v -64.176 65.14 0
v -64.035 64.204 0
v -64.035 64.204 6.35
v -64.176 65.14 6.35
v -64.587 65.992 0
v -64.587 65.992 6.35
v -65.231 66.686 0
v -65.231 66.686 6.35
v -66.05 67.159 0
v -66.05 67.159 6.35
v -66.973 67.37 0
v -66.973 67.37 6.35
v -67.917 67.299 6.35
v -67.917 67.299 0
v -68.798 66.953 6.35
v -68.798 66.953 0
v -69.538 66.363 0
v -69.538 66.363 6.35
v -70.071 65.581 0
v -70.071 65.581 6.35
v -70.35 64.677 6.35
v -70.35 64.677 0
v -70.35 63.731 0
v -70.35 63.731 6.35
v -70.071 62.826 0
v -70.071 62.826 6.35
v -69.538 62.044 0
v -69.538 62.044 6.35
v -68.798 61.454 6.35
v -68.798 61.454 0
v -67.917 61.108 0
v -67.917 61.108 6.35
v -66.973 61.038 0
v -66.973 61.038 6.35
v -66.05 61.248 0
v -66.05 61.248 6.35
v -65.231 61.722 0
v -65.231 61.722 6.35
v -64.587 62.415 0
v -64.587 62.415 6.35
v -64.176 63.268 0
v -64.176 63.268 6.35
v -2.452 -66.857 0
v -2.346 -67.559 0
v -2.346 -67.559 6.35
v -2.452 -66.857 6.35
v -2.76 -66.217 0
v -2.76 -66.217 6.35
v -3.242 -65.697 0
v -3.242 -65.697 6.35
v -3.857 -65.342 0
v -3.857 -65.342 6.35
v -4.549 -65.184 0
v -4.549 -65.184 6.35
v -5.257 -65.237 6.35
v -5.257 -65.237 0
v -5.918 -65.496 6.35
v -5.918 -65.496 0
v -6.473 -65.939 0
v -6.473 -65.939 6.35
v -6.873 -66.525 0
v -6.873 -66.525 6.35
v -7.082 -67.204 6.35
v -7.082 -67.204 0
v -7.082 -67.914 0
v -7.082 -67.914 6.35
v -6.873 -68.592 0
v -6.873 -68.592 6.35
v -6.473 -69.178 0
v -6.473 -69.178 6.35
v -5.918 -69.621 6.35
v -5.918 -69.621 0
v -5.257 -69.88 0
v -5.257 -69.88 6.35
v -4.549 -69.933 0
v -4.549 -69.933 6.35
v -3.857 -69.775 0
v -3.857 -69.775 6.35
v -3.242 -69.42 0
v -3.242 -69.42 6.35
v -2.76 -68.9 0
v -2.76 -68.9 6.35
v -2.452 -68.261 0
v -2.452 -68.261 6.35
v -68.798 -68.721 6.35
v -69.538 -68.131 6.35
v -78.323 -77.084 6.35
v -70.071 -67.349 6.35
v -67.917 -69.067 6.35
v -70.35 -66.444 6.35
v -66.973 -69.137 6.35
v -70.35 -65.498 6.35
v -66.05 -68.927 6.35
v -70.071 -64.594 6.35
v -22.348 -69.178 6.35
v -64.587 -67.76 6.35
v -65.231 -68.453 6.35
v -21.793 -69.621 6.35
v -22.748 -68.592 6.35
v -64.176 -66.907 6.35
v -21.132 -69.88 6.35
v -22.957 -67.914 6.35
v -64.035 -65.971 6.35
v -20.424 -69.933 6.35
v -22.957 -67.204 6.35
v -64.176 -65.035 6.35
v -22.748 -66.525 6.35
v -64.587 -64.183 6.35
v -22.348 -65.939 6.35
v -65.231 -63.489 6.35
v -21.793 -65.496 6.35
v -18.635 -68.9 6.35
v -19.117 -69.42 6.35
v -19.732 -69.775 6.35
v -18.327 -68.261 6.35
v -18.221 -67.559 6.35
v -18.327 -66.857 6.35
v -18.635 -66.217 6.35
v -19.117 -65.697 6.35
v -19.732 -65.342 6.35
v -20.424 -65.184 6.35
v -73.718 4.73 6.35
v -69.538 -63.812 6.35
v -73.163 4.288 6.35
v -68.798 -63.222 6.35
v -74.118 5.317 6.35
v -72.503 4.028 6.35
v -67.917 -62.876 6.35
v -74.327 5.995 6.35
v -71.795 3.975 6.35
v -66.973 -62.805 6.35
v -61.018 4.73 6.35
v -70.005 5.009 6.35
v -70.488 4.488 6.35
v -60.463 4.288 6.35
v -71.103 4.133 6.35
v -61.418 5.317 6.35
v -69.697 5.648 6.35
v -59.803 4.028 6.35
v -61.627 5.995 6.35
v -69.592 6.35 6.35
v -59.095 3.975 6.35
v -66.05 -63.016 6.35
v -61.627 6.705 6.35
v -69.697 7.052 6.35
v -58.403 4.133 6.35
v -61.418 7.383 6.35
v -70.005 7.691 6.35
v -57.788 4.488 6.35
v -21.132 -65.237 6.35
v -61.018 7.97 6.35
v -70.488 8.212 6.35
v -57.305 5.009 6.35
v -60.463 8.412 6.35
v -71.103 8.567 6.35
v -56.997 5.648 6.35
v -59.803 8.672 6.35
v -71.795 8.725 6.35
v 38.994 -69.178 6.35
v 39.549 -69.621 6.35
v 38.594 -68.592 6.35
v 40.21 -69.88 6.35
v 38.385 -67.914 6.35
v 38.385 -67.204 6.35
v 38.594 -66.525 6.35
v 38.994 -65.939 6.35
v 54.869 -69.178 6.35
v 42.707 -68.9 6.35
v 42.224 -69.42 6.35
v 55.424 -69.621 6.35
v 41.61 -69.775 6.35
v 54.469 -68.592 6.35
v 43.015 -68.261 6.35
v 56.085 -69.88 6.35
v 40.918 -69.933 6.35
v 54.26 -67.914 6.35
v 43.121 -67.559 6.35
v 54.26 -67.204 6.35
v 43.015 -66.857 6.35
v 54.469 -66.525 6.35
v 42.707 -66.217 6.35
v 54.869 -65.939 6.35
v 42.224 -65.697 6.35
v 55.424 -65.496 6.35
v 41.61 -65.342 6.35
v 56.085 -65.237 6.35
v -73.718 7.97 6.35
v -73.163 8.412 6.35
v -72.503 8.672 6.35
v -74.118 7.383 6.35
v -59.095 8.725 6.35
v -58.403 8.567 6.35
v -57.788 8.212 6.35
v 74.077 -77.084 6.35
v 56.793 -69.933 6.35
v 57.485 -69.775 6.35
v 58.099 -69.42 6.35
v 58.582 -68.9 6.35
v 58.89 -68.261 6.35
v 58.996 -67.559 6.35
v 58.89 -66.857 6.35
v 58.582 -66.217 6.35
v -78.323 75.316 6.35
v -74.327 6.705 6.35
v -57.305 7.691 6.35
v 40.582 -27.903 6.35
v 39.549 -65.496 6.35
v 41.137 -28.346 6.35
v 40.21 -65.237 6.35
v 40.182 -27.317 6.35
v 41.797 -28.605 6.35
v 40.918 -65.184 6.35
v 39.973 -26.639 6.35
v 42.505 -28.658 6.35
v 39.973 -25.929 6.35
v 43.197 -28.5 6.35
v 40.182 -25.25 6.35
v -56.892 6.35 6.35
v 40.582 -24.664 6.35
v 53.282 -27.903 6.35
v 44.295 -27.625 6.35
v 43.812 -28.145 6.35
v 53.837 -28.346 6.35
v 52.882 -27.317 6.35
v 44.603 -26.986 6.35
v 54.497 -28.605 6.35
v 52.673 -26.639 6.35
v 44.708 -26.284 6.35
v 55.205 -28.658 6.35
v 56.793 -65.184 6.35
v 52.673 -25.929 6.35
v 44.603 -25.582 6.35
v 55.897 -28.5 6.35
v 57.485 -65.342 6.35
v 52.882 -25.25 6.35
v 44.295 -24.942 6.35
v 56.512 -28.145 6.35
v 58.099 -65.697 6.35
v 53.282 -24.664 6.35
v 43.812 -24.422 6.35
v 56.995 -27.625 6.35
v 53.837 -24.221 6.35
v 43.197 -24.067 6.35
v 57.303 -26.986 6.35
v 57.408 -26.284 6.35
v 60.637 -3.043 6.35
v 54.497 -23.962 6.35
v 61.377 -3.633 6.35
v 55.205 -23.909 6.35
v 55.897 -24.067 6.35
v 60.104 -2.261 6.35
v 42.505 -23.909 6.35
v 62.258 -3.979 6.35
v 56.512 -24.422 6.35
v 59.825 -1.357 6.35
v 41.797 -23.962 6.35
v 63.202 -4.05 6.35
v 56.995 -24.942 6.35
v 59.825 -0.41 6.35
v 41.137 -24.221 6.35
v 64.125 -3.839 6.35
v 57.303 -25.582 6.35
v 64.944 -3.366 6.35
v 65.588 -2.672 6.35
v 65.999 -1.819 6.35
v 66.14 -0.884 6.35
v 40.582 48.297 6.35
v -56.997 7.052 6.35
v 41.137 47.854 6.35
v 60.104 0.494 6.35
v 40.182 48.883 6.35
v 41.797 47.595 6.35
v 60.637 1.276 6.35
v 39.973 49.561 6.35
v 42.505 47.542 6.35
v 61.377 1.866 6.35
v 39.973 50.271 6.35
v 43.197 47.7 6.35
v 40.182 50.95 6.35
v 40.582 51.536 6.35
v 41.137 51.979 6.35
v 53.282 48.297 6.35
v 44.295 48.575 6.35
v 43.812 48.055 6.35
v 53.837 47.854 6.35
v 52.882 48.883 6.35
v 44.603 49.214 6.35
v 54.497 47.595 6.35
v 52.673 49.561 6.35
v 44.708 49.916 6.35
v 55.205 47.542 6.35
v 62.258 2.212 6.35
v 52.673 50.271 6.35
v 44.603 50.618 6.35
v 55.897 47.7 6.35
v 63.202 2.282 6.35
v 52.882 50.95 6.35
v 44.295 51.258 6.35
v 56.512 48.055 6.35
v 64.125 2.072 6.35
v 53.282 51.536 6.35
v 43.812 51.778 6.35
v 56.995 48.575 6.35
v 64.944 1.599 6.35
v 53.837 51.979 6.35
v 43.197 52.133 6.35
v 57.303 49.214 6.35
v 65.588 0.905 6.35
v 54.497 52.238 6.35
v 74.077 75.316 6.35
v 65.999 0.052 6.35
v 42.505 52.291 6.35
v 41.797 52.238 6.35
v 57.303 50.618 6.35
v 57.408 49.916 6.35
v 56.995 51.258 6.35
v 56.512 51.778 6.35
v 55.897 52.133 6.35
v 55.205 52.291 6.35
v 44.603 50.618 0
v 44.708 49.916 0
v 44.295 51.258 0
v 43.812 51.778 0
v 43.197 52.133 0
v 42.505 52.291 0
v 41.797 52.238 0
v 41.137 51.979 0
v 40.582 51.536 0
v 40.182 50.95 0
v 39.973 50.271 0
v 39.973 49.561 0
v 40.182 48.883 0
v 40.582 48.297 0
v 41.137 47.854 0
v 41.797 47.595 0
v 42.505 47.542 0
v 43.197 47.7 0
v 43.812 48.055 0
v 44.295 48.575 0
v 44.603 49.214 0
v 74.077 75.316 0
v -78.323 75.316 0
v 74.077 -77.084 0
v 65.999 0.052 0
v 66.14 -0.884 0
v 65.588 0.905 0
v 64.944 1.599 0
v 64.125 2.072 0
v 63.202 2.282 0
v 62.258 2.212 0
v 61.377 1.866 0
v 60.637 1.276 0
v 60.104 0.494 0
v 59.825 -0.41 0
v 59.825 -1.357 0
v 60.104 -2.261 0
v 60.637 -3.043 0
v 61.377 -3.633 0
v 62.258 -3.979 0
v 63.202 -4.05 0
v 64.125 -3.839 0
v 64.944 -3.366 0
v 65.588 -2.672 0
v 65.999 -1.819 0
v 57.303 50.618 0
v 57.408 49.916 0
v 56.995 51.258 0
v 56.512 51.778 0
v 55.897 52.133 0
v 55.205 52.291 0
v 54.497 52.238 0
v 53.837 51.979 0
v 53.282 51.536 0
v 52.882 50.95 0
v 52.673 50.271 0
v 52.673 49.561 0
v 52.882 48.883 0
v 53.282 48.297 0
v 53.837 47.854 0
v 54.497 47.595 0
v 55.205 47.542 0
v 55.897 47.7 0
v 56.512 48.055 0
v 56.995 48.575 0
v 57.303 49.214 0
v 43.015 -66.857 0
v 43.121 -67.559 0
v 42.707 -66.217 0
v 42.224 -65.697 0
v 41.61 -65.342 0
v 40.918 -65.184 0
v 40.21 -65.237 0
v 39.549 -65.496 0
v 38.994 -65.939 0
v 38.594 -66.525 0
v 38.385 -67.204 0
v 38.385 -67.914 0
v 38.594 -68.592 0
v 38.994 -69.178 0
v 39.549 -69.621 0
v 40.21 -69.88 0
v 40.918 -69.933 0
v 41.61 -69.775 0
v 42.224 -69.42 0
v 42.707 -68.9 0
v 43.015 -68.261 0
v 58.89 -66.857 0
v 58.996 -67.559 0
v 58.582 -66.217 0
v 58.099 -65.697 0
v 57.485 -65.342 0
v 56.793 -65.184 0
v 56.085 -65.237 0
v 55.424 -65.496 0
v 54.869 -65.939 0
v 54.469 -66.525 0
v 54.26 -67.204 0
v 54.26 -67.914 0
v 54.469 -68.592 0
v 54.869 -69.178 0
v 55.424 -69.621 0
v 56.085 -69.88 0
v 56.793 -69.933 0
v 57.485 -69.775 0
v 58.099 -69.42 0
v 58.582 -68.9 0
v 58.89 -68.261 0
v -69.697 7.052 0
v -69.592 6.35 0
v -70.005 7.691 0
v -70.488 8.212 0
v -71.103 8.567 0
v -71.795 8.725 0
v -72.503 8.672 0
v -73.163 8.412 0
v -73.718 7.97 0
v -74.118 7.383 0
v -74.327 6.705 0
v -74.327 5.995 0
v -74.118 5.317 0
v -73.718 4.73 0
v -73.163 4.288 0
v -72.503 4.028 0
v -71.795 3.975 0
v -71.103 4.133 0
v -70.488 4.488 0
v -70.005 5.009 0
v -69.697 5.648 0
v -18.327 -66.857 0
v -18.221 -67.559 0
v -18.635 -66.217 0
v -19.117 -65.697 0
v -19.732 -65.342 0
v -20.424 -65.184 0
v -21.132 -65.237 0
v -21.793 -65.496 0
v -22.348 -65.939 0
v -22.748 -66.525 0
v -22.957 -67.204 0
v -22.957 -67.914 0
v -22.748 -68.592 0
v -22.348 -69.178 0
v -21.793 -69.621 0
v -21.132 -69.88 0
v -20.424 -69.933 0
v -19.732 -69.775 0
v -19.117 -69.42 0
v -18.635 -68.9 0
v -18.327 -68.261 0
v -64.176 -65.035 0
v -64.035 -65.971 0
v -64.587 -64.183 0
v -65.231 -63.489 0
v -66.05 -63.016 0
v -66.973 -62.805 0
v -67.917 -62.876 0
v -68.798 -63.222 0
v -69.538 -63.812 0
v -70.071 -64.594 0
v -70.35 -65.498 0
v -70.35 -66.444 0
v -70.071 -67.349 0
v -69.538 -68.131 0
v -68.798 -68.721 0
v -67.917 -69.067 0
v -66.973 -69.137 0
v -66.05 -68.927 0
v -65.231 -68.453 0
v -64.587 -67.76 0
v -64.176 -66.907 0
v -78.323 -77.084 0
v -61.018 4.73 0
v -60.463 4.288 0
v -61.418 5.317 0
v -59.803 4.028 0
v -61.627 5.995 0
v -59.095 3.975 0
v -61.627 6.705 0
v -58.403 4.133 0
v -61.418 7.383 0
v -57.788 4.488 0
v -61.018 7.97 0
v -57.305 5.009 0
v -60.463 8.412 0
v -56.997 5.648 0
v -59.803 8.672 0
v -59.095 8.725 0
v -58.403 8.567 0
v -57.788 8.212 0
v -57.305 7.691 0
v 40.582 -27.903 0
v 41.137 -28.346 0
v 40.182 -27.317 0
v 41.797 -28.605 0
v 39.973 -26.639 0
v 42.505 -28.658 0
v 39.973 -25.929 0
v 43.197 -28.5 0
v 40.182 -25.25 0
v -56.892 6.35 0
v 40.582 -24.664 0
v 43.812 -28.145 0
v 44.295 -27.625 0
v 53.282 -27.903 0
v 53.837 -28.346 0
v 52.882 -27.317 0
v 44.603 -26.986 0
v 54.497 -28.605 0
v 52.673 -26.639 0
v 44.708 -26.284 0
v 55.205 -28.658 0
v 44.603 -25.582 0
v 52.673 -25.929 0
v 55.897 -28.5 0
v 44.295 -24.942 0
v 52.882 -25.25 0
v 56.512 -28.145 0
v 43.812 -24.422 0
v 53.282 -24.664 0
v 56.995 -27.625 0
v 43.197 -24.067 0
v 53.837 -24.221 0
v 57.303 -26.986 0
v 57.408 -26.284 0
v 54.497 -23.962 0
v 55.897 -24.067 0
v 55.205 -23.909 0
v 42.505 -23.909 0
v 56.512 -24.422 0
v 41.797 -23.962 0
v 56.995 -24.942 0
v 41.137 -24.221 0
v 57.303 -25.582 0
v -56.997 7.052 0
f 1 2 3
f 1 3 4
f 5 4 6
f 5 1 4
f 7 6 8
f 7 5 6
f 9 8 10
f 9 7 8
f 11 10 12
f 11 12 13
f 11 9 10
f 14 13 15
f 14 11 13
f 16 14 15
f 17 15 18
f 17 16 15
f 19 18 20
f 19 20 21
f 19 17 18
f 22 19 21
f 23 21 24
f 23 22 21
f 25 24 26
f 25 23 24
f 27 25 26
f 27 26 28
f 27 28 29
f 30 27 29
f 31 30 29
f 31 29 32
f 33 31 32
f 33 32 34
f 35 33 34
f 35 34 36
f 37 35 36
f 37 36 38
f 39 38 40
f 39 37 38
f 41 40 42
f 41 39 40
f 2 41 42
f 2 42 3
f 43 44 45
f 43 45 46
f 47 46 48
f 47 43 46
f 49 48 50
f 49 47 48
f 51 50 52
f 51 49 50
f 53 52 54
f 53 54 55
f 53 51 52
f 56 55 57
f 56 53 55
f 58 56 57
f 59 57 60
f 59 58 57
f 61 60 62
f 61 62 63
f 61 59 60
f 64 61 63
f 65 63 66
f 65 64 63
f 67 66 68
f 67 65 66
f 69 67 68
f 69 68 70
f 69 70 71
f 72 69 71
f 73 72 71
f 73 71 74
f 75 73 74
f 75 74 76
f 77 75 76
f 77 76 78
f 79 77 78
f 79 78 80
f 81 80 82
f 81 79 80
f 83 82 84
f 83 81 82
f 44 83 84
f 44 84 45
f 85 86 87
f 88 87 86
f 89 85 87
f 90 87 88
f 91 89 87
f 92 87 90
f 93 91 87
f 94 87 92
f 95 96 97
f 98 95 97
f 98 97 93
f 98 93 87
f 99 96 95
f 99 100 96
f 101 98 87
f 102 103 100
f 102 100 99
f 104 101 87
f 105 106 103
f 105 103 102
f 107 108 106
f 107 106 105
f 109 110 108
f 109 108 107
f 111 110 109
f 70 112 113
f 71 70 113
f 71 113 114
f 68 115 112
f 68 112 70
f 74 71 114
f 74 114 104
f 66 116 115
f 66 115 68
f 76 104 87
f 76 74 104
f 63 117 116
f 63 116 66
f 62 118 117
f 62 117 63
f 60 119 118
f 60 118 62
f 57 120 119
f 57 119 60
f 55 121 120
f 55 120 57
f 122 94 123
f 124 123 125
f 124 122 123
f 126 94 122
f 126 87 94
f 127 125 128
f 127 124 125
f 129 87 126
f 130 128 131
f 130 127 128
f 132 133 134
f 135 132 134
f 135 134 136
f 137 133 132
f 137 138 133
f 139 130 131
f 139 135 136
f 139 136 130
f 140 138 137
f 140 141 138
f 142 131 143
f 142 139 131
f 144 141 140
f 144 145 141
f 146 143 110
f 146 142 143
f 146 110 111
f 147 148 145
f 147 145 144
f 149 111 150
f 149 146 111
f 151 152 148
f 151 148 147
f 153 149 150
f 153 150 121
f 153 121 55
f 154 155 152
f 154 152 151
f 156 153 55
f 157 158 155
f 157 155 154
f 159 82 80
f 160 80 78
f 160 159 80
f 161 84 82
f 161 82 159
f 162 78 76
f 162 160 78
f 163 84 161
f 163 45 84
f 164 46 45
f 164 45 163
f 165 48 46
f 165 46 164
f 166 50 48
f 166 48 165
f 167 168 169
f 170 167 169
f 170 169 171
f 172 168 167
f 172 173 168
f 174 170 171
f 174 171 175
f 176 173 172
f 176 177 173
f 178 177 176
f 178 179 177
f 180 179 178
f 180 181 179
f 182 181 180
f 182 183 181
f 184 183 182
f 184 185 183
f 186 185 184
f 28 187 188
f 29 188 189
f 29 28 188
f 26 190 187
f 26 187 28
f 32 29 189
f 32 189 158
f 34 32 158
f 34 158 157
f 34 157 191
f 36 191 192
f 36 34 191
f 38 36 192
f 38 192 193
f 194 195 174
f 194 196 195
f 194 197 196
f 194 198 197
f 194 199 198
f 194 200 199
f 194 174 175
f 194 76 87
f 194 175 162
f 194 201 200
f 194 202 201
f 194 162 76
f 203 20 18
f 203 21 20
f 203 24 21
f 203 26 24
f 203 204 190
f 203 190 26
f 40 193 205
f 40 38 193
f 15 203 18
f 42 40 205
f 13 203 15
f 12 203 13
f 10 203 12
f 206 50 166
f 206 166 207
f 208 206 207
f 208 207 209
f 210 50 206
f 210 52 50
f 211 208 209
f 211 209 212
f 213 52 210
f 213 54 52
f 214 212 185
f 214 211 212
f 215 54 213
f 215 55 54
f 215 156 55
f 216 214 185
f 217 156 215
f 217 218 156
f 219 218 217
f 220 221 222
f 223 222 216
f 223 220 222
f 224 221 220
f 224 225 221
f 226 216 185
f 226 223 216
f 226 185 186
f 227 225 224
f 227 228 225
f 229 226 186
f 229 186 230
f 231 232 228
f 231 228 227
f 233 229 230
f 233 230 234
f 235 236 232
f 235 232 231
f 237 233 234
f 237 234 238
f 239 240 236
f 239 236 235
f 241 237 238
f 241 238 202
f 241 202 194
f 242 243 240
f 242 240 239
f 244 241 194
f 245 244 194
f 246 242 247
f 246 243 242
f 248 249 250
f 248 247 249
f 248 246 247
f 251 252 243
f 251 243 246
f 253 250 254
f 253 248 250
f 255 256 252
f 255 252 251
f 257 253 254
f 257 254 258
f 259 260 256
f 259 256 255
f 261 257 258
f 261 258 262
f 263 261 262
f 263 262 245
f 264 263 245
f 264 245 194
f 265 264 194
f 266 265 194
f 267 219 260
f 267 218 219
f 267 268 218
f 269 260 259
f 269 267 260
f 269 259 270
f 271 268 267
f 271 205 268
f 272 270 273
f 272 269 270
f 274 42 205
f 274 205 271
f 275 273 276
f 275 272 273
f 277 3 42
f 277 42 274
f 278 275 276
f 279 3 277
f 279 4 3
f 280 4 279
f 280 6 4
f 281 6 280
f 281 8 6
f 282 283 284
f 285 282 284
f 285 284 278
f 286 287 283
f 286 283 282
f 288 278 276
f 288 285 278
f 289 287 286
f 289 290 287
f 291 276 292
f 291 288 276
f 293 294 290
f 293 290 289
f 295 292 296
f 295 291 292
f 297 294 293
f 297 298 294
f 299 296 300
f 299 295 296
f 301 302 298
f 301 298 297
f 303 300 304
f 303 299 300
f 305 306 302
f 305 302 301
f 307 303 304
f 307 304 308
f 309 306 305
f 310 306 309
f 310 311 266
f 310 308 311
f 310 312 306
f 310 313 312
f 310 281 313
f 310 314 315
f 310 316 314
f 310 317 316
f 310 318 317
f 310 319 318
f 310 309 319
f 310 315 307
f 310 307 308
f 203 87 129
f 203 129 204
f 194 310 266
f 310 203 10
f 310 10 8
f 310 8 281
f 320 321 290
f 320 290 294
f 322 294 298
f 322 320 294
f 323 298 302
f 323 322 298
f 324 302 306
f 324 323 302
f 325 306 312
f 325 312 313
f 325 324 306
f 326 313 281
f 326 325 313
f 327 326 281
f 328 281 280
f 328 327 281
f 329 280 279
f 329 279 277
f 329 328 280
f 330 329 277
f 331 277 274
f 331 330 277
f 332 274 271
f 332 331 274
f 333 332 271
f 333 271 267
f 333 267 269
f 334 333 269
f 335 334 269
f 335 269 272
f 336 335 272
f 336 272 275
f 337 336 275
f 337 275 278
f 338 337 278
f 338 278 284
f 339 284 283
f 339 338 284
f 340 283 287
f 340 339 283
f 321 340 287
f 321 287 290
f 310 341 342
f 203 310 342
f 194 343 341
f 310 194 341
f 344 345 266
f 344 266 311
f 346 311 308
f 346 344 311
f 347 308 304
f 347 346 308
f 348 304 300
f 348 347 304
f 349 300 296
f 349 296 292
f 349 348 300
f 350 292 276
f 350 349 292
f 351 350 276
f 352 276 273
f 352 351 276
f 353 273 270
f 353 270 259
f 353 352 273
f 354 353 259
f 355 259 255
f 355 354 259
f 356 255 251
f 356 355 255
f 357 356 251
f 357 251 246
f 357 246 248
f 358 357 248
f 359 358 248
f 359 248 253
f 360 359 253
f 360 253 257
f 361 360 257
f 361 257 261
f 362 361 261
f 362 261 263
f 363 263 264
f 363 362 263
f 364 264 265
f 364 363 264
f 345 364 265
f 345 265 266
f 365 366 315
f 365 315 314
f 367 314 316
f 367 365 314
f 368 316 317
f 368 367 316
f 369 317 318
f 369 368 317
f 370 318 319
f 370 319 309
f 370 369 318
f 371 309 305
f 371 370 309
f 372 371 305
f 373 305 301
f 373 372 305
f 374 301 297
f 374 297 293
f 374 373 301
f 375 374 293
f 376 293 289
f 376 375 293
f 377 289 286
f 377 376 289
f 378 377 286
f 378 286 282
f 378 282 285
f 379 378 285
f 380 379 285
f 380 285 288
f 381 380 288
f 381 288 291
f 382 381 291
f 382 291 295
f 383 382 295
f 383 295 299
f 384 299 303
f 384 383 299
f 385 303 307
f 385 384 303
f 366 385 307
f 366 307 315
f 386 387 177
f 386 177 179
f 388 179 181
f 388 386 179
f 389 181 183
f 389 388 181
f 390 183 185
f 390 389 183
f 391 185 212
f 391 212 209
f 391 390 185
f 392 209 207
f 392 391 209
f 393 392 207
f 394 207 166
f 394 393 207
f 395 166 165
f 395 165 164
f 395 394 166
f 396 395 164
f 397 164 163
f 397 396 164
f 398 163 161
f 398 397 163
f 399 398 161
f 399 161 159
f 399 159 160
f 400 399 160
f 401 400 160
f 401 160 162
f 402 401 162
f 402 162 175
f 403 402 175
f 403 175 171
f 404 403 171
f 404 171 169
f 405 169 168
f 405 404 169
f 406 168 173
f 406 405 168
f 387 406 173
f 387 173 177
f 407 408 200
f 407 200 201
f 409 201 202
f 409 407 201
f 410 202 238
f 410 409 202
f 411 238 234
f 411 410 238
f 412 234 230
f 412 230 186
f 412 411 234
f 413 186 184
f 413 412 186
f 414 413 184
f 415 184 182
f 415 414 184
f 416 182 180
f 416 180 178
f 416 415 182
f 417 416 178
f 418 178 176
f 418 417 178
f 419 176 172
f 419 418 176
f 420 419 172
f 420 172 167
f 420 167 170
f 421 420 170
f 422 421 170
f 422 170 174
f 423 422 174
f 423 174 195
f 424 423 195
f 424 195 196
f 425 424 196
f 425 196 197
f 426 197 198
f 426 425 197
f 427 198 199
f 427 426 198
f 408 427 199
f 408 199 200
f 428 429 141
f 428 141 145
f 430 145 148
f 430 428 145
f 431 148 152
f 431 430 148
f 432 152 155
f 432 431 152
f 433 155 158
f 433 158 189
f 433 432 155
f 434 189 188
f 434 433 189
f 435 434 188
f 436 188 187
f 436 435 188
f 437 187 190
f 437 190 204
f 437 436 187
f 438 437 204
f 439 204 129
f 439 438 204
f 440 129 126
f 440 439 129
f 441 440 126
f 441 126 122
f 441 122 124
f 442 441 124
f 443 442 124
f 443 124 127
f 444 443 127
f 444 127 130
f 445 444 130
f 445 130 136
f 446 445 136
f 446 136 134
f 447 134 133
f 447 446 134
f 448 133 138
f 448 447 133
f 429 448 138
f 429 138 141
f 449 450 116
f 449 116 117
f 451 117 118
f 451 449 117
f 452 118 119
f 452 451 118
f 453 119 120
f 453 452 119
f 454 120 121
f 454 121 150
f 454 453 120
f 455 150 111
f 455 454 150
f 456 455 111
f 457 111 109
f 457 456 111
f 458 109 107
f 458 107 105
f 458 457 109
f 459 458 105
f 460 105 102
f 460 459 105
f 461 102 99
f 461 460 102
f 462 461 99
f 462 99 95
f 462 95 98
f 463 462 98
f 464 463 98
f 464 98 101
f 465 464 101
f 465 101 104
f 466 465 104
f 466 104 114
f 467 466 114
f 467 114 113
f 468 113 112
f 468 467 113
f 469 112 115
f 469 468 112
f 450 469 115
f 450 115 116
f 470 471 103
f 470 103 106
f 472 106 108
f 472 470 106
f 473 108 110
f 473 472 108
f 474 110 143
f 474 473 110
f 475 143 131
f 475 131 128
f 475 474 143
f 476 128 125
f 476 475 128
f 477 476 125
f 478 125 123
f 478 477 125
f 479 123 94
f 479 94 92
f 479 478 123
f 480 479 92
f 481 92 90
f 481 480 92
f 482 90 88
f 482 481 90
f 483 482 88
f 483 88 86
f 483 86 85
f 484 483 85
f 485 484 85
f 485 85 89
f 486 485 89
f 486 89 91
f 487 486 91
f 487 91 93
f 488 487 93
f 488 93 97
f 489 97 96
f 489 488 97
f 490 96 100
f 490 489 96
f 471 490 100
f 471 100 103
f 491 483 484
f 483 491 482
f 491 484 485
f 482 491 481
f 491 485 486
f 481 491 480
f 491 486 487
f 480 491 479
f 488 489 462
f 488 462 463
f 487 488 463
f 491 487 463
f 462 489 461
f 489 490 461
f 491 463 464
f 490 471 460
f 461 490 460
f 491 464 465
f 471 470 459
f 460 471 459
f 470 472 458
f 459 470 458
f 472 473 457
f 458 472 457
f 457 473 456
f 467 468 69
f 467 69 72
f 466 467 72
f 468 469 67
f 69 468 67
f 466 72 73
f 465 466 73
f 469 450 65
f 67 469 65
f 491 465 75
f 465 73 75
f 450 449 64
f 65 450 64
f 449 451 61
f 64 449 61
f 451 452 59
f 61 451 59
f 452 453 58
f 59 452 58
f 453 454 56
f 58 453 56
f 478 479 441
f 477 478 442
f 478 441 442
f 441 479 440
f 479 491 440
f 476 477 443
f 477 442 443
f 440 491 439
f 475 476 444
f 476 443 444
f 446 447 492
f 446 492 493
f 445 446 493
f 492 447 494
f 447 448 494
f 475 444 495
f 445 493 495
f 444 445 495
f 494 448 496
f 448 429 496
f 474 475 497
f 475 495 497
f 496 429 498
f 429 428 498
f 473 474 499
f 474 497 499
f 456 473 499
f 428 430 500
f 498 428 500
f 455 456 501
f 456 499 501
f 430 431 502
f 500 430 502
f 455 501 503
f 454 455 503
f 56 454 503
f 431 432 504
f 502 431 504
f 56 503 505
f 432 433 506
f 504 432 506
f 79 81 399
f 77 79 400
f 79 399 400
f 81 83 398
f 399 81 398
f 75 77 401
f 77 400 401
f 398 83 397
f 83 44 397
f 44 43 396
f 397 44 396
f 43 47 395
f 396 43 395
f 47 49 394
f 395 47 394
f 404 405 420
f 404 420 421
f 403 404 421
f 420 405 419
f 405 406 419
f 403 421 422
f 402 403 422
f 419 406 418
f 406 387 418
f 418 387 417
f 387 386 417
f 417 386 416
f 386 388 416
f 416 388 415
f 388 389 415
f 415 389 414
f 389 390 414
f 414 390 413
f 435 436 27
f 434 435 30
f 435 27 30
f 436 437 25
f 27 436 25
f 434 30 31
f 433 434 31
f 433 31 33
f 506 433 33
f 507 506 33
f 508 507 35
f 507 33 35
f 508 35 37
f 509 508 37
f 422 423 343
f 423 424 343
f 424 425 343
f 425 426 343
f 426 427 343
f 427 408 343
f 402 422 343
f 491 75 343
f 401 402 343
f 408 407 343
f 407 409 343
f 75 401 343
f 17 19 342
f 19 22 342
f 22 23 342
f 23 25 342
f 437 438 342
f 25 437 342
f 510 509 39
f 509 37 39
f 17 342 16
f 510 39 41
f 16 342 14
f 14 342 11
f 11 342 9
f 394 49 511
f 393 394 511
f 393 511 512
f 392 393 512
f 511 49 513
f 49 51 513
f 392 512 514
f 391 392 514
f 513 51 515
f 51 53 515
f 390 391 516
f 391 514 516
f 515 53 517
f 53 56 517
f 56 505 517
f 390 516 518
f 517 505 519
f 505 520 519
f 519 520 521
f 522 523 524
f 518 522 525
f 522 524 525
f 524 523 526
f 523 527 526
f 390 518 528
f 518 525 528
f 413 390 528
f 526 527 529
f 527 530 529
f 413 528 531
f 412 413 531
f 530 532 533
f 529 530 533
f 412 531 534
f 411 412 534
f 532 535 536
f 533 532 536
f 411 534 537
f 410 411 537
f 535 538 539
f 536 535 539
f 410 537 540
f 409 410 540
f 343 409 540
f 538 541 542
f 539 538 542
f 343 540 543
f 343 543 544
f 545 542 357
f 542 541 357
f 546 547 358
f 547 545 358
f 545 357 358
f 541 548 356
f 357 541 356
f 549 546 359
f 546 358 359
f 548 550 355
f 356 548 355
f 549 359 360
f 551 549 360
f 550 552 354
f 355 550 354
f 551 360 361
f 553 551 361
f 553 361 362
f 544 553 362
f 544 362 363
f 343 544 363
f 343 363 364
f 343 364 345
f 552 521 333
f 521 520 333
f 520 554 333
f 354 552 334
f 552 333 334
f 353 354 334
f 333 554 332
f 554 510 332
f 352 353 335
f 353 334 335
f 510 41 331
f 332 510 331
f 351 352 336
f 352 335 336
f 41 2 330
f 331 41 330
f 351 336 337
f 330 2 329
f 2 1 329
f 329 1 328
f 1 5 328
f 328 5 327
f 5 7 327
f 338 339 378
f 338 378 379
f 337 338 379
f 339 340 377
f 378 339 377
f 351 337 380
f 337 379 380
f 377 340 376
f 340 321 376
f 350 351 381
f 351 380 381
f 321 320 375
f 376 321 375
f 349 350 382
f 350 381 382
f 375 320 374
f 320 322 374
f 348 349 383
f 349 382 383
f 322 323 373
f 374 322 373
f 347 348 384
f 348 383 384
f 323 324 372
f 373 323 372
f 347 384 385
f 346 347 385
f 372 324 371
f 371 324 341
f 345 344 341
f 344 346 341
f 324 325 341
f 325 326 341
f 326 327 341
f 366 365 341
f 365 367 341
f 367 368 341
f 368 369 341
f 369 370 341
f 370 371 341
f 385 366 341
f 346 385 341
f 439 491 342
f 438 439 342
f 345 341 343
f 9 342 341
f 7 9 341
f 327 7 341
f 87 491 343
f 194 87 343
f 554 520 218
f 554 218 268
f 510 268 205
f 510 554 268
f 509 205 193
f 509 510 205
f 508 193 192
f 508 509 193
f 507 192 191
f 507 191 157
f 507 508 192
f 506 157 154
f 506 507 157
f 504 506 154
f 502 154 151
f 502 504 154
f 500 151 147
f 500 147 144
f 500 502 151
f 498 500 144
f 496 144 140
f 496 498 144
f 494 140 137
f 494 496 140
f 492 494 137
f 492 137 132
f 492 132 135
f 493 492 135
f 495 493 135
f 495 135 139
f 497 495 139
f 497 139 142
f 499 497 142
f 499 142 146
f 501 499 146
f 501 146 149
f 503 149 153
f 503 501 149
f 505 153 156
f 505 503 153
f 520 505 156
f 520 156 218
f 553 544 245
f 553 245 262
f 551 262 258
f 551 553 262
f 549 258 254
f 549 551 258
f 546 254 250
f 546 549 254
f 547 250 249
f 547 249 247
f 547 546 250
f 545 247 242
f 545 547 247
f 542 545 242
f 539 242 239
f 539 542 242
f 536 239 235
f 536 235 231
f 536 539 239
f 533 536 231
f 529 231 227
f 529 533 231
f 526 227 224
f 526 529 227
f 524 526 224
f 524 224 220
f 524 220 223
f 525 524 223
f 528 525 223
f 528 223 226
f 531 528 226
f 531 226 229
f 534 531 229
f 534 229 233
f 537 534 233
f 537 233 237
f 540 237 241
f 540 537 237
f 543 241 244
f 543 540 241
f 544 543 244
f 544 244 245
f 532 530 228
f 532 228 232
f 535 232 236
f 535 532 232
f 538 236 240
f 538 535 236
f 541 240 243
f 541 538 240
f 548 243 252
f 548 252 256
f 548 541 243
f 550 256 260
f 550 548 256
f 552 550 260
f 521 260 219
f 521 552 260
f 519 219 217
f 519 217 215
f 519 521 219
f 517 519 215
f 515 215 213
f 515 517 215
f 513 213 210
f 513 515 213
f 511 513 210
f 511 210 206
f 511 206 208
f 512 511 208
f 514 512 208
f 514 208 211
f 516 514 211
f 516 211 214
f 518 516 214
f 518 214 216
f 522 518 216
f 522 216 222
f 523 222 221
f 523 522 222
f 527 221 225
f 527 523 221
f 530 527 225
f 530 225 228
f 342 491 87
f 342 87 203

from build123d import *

# Parameters (mm, degrees)
F0_W     = 127
F0_H     = 152.4
F0_R     = 3.175
F0_R_2   = 2.38125
F0_W_2   = 25.4
F1_DEPTH = 6.35


with BuildPart() as f1:
    # F0 (on Top) → F1 (new body)
    with BuildSketch(Plane.XY):
        with Locations((-14.822774, -0.883641)):
            Rectangle(F0_W, F0_H)
        with Locations((-67.210274, -65.971141)):
            Circle(F0_R, mode=Mode.SUBTRACT)
        with Locations((-20.602145, -67.558641)):
            Circle(F0_R_2, mode=Mode.SUBTRACT)
        with Locations((-4.727145, -67.558641)):
            Circle(F0_R_2, mode=Mode.SUBTRACT)
        with Locations((40.739726, -67.558641)):
            Circle(F0_R_2, mode=Mode.SUBTRACT)
        with Locations((42.327226, -26.283641)):
            Circle(F0_R_2, mode=Mode.SUBTRACT)
        with Locations((-71.972774, 6.35)):
            Circle(F0_R_2, mode=Mode.SUBTRACT)
        with Locations((-59.272774, 6.35)):
            Circle(F0_R_2, mode=Mode.SUBTRACT)
        with Locations((-67.210274, 64.203859)):
            Circle(F0_R, mode=Mode.SUBTRACT)
        with Locations((42.327226, 49.916359)):
            Circle(F0_R_2, mode=Mode.SUBTRACT)
        with Locations((61.377226, -0.883641)):
            Rectangle(F0_W_2, F0_H)
        with Locations((56.614726, -67.558641)):
            Circle(F0_R_2, mode=Mode.SUBTRACT)
        with Locations((55.027226, -26.283641)):
            Circle(F0_R_2, mode=Mode.SUBTRACT)
        with Locations((62.964726, -0.883641)):
            Circle(F0_R, mode=Mode.SUBTRACT)
        with Locations((55.027226, 49.916359)):
            Circle(F0_R_2, mode=Mode.SUBTRACT)
    extrude(amount=F1_DEPTH)


solid = f1.part
